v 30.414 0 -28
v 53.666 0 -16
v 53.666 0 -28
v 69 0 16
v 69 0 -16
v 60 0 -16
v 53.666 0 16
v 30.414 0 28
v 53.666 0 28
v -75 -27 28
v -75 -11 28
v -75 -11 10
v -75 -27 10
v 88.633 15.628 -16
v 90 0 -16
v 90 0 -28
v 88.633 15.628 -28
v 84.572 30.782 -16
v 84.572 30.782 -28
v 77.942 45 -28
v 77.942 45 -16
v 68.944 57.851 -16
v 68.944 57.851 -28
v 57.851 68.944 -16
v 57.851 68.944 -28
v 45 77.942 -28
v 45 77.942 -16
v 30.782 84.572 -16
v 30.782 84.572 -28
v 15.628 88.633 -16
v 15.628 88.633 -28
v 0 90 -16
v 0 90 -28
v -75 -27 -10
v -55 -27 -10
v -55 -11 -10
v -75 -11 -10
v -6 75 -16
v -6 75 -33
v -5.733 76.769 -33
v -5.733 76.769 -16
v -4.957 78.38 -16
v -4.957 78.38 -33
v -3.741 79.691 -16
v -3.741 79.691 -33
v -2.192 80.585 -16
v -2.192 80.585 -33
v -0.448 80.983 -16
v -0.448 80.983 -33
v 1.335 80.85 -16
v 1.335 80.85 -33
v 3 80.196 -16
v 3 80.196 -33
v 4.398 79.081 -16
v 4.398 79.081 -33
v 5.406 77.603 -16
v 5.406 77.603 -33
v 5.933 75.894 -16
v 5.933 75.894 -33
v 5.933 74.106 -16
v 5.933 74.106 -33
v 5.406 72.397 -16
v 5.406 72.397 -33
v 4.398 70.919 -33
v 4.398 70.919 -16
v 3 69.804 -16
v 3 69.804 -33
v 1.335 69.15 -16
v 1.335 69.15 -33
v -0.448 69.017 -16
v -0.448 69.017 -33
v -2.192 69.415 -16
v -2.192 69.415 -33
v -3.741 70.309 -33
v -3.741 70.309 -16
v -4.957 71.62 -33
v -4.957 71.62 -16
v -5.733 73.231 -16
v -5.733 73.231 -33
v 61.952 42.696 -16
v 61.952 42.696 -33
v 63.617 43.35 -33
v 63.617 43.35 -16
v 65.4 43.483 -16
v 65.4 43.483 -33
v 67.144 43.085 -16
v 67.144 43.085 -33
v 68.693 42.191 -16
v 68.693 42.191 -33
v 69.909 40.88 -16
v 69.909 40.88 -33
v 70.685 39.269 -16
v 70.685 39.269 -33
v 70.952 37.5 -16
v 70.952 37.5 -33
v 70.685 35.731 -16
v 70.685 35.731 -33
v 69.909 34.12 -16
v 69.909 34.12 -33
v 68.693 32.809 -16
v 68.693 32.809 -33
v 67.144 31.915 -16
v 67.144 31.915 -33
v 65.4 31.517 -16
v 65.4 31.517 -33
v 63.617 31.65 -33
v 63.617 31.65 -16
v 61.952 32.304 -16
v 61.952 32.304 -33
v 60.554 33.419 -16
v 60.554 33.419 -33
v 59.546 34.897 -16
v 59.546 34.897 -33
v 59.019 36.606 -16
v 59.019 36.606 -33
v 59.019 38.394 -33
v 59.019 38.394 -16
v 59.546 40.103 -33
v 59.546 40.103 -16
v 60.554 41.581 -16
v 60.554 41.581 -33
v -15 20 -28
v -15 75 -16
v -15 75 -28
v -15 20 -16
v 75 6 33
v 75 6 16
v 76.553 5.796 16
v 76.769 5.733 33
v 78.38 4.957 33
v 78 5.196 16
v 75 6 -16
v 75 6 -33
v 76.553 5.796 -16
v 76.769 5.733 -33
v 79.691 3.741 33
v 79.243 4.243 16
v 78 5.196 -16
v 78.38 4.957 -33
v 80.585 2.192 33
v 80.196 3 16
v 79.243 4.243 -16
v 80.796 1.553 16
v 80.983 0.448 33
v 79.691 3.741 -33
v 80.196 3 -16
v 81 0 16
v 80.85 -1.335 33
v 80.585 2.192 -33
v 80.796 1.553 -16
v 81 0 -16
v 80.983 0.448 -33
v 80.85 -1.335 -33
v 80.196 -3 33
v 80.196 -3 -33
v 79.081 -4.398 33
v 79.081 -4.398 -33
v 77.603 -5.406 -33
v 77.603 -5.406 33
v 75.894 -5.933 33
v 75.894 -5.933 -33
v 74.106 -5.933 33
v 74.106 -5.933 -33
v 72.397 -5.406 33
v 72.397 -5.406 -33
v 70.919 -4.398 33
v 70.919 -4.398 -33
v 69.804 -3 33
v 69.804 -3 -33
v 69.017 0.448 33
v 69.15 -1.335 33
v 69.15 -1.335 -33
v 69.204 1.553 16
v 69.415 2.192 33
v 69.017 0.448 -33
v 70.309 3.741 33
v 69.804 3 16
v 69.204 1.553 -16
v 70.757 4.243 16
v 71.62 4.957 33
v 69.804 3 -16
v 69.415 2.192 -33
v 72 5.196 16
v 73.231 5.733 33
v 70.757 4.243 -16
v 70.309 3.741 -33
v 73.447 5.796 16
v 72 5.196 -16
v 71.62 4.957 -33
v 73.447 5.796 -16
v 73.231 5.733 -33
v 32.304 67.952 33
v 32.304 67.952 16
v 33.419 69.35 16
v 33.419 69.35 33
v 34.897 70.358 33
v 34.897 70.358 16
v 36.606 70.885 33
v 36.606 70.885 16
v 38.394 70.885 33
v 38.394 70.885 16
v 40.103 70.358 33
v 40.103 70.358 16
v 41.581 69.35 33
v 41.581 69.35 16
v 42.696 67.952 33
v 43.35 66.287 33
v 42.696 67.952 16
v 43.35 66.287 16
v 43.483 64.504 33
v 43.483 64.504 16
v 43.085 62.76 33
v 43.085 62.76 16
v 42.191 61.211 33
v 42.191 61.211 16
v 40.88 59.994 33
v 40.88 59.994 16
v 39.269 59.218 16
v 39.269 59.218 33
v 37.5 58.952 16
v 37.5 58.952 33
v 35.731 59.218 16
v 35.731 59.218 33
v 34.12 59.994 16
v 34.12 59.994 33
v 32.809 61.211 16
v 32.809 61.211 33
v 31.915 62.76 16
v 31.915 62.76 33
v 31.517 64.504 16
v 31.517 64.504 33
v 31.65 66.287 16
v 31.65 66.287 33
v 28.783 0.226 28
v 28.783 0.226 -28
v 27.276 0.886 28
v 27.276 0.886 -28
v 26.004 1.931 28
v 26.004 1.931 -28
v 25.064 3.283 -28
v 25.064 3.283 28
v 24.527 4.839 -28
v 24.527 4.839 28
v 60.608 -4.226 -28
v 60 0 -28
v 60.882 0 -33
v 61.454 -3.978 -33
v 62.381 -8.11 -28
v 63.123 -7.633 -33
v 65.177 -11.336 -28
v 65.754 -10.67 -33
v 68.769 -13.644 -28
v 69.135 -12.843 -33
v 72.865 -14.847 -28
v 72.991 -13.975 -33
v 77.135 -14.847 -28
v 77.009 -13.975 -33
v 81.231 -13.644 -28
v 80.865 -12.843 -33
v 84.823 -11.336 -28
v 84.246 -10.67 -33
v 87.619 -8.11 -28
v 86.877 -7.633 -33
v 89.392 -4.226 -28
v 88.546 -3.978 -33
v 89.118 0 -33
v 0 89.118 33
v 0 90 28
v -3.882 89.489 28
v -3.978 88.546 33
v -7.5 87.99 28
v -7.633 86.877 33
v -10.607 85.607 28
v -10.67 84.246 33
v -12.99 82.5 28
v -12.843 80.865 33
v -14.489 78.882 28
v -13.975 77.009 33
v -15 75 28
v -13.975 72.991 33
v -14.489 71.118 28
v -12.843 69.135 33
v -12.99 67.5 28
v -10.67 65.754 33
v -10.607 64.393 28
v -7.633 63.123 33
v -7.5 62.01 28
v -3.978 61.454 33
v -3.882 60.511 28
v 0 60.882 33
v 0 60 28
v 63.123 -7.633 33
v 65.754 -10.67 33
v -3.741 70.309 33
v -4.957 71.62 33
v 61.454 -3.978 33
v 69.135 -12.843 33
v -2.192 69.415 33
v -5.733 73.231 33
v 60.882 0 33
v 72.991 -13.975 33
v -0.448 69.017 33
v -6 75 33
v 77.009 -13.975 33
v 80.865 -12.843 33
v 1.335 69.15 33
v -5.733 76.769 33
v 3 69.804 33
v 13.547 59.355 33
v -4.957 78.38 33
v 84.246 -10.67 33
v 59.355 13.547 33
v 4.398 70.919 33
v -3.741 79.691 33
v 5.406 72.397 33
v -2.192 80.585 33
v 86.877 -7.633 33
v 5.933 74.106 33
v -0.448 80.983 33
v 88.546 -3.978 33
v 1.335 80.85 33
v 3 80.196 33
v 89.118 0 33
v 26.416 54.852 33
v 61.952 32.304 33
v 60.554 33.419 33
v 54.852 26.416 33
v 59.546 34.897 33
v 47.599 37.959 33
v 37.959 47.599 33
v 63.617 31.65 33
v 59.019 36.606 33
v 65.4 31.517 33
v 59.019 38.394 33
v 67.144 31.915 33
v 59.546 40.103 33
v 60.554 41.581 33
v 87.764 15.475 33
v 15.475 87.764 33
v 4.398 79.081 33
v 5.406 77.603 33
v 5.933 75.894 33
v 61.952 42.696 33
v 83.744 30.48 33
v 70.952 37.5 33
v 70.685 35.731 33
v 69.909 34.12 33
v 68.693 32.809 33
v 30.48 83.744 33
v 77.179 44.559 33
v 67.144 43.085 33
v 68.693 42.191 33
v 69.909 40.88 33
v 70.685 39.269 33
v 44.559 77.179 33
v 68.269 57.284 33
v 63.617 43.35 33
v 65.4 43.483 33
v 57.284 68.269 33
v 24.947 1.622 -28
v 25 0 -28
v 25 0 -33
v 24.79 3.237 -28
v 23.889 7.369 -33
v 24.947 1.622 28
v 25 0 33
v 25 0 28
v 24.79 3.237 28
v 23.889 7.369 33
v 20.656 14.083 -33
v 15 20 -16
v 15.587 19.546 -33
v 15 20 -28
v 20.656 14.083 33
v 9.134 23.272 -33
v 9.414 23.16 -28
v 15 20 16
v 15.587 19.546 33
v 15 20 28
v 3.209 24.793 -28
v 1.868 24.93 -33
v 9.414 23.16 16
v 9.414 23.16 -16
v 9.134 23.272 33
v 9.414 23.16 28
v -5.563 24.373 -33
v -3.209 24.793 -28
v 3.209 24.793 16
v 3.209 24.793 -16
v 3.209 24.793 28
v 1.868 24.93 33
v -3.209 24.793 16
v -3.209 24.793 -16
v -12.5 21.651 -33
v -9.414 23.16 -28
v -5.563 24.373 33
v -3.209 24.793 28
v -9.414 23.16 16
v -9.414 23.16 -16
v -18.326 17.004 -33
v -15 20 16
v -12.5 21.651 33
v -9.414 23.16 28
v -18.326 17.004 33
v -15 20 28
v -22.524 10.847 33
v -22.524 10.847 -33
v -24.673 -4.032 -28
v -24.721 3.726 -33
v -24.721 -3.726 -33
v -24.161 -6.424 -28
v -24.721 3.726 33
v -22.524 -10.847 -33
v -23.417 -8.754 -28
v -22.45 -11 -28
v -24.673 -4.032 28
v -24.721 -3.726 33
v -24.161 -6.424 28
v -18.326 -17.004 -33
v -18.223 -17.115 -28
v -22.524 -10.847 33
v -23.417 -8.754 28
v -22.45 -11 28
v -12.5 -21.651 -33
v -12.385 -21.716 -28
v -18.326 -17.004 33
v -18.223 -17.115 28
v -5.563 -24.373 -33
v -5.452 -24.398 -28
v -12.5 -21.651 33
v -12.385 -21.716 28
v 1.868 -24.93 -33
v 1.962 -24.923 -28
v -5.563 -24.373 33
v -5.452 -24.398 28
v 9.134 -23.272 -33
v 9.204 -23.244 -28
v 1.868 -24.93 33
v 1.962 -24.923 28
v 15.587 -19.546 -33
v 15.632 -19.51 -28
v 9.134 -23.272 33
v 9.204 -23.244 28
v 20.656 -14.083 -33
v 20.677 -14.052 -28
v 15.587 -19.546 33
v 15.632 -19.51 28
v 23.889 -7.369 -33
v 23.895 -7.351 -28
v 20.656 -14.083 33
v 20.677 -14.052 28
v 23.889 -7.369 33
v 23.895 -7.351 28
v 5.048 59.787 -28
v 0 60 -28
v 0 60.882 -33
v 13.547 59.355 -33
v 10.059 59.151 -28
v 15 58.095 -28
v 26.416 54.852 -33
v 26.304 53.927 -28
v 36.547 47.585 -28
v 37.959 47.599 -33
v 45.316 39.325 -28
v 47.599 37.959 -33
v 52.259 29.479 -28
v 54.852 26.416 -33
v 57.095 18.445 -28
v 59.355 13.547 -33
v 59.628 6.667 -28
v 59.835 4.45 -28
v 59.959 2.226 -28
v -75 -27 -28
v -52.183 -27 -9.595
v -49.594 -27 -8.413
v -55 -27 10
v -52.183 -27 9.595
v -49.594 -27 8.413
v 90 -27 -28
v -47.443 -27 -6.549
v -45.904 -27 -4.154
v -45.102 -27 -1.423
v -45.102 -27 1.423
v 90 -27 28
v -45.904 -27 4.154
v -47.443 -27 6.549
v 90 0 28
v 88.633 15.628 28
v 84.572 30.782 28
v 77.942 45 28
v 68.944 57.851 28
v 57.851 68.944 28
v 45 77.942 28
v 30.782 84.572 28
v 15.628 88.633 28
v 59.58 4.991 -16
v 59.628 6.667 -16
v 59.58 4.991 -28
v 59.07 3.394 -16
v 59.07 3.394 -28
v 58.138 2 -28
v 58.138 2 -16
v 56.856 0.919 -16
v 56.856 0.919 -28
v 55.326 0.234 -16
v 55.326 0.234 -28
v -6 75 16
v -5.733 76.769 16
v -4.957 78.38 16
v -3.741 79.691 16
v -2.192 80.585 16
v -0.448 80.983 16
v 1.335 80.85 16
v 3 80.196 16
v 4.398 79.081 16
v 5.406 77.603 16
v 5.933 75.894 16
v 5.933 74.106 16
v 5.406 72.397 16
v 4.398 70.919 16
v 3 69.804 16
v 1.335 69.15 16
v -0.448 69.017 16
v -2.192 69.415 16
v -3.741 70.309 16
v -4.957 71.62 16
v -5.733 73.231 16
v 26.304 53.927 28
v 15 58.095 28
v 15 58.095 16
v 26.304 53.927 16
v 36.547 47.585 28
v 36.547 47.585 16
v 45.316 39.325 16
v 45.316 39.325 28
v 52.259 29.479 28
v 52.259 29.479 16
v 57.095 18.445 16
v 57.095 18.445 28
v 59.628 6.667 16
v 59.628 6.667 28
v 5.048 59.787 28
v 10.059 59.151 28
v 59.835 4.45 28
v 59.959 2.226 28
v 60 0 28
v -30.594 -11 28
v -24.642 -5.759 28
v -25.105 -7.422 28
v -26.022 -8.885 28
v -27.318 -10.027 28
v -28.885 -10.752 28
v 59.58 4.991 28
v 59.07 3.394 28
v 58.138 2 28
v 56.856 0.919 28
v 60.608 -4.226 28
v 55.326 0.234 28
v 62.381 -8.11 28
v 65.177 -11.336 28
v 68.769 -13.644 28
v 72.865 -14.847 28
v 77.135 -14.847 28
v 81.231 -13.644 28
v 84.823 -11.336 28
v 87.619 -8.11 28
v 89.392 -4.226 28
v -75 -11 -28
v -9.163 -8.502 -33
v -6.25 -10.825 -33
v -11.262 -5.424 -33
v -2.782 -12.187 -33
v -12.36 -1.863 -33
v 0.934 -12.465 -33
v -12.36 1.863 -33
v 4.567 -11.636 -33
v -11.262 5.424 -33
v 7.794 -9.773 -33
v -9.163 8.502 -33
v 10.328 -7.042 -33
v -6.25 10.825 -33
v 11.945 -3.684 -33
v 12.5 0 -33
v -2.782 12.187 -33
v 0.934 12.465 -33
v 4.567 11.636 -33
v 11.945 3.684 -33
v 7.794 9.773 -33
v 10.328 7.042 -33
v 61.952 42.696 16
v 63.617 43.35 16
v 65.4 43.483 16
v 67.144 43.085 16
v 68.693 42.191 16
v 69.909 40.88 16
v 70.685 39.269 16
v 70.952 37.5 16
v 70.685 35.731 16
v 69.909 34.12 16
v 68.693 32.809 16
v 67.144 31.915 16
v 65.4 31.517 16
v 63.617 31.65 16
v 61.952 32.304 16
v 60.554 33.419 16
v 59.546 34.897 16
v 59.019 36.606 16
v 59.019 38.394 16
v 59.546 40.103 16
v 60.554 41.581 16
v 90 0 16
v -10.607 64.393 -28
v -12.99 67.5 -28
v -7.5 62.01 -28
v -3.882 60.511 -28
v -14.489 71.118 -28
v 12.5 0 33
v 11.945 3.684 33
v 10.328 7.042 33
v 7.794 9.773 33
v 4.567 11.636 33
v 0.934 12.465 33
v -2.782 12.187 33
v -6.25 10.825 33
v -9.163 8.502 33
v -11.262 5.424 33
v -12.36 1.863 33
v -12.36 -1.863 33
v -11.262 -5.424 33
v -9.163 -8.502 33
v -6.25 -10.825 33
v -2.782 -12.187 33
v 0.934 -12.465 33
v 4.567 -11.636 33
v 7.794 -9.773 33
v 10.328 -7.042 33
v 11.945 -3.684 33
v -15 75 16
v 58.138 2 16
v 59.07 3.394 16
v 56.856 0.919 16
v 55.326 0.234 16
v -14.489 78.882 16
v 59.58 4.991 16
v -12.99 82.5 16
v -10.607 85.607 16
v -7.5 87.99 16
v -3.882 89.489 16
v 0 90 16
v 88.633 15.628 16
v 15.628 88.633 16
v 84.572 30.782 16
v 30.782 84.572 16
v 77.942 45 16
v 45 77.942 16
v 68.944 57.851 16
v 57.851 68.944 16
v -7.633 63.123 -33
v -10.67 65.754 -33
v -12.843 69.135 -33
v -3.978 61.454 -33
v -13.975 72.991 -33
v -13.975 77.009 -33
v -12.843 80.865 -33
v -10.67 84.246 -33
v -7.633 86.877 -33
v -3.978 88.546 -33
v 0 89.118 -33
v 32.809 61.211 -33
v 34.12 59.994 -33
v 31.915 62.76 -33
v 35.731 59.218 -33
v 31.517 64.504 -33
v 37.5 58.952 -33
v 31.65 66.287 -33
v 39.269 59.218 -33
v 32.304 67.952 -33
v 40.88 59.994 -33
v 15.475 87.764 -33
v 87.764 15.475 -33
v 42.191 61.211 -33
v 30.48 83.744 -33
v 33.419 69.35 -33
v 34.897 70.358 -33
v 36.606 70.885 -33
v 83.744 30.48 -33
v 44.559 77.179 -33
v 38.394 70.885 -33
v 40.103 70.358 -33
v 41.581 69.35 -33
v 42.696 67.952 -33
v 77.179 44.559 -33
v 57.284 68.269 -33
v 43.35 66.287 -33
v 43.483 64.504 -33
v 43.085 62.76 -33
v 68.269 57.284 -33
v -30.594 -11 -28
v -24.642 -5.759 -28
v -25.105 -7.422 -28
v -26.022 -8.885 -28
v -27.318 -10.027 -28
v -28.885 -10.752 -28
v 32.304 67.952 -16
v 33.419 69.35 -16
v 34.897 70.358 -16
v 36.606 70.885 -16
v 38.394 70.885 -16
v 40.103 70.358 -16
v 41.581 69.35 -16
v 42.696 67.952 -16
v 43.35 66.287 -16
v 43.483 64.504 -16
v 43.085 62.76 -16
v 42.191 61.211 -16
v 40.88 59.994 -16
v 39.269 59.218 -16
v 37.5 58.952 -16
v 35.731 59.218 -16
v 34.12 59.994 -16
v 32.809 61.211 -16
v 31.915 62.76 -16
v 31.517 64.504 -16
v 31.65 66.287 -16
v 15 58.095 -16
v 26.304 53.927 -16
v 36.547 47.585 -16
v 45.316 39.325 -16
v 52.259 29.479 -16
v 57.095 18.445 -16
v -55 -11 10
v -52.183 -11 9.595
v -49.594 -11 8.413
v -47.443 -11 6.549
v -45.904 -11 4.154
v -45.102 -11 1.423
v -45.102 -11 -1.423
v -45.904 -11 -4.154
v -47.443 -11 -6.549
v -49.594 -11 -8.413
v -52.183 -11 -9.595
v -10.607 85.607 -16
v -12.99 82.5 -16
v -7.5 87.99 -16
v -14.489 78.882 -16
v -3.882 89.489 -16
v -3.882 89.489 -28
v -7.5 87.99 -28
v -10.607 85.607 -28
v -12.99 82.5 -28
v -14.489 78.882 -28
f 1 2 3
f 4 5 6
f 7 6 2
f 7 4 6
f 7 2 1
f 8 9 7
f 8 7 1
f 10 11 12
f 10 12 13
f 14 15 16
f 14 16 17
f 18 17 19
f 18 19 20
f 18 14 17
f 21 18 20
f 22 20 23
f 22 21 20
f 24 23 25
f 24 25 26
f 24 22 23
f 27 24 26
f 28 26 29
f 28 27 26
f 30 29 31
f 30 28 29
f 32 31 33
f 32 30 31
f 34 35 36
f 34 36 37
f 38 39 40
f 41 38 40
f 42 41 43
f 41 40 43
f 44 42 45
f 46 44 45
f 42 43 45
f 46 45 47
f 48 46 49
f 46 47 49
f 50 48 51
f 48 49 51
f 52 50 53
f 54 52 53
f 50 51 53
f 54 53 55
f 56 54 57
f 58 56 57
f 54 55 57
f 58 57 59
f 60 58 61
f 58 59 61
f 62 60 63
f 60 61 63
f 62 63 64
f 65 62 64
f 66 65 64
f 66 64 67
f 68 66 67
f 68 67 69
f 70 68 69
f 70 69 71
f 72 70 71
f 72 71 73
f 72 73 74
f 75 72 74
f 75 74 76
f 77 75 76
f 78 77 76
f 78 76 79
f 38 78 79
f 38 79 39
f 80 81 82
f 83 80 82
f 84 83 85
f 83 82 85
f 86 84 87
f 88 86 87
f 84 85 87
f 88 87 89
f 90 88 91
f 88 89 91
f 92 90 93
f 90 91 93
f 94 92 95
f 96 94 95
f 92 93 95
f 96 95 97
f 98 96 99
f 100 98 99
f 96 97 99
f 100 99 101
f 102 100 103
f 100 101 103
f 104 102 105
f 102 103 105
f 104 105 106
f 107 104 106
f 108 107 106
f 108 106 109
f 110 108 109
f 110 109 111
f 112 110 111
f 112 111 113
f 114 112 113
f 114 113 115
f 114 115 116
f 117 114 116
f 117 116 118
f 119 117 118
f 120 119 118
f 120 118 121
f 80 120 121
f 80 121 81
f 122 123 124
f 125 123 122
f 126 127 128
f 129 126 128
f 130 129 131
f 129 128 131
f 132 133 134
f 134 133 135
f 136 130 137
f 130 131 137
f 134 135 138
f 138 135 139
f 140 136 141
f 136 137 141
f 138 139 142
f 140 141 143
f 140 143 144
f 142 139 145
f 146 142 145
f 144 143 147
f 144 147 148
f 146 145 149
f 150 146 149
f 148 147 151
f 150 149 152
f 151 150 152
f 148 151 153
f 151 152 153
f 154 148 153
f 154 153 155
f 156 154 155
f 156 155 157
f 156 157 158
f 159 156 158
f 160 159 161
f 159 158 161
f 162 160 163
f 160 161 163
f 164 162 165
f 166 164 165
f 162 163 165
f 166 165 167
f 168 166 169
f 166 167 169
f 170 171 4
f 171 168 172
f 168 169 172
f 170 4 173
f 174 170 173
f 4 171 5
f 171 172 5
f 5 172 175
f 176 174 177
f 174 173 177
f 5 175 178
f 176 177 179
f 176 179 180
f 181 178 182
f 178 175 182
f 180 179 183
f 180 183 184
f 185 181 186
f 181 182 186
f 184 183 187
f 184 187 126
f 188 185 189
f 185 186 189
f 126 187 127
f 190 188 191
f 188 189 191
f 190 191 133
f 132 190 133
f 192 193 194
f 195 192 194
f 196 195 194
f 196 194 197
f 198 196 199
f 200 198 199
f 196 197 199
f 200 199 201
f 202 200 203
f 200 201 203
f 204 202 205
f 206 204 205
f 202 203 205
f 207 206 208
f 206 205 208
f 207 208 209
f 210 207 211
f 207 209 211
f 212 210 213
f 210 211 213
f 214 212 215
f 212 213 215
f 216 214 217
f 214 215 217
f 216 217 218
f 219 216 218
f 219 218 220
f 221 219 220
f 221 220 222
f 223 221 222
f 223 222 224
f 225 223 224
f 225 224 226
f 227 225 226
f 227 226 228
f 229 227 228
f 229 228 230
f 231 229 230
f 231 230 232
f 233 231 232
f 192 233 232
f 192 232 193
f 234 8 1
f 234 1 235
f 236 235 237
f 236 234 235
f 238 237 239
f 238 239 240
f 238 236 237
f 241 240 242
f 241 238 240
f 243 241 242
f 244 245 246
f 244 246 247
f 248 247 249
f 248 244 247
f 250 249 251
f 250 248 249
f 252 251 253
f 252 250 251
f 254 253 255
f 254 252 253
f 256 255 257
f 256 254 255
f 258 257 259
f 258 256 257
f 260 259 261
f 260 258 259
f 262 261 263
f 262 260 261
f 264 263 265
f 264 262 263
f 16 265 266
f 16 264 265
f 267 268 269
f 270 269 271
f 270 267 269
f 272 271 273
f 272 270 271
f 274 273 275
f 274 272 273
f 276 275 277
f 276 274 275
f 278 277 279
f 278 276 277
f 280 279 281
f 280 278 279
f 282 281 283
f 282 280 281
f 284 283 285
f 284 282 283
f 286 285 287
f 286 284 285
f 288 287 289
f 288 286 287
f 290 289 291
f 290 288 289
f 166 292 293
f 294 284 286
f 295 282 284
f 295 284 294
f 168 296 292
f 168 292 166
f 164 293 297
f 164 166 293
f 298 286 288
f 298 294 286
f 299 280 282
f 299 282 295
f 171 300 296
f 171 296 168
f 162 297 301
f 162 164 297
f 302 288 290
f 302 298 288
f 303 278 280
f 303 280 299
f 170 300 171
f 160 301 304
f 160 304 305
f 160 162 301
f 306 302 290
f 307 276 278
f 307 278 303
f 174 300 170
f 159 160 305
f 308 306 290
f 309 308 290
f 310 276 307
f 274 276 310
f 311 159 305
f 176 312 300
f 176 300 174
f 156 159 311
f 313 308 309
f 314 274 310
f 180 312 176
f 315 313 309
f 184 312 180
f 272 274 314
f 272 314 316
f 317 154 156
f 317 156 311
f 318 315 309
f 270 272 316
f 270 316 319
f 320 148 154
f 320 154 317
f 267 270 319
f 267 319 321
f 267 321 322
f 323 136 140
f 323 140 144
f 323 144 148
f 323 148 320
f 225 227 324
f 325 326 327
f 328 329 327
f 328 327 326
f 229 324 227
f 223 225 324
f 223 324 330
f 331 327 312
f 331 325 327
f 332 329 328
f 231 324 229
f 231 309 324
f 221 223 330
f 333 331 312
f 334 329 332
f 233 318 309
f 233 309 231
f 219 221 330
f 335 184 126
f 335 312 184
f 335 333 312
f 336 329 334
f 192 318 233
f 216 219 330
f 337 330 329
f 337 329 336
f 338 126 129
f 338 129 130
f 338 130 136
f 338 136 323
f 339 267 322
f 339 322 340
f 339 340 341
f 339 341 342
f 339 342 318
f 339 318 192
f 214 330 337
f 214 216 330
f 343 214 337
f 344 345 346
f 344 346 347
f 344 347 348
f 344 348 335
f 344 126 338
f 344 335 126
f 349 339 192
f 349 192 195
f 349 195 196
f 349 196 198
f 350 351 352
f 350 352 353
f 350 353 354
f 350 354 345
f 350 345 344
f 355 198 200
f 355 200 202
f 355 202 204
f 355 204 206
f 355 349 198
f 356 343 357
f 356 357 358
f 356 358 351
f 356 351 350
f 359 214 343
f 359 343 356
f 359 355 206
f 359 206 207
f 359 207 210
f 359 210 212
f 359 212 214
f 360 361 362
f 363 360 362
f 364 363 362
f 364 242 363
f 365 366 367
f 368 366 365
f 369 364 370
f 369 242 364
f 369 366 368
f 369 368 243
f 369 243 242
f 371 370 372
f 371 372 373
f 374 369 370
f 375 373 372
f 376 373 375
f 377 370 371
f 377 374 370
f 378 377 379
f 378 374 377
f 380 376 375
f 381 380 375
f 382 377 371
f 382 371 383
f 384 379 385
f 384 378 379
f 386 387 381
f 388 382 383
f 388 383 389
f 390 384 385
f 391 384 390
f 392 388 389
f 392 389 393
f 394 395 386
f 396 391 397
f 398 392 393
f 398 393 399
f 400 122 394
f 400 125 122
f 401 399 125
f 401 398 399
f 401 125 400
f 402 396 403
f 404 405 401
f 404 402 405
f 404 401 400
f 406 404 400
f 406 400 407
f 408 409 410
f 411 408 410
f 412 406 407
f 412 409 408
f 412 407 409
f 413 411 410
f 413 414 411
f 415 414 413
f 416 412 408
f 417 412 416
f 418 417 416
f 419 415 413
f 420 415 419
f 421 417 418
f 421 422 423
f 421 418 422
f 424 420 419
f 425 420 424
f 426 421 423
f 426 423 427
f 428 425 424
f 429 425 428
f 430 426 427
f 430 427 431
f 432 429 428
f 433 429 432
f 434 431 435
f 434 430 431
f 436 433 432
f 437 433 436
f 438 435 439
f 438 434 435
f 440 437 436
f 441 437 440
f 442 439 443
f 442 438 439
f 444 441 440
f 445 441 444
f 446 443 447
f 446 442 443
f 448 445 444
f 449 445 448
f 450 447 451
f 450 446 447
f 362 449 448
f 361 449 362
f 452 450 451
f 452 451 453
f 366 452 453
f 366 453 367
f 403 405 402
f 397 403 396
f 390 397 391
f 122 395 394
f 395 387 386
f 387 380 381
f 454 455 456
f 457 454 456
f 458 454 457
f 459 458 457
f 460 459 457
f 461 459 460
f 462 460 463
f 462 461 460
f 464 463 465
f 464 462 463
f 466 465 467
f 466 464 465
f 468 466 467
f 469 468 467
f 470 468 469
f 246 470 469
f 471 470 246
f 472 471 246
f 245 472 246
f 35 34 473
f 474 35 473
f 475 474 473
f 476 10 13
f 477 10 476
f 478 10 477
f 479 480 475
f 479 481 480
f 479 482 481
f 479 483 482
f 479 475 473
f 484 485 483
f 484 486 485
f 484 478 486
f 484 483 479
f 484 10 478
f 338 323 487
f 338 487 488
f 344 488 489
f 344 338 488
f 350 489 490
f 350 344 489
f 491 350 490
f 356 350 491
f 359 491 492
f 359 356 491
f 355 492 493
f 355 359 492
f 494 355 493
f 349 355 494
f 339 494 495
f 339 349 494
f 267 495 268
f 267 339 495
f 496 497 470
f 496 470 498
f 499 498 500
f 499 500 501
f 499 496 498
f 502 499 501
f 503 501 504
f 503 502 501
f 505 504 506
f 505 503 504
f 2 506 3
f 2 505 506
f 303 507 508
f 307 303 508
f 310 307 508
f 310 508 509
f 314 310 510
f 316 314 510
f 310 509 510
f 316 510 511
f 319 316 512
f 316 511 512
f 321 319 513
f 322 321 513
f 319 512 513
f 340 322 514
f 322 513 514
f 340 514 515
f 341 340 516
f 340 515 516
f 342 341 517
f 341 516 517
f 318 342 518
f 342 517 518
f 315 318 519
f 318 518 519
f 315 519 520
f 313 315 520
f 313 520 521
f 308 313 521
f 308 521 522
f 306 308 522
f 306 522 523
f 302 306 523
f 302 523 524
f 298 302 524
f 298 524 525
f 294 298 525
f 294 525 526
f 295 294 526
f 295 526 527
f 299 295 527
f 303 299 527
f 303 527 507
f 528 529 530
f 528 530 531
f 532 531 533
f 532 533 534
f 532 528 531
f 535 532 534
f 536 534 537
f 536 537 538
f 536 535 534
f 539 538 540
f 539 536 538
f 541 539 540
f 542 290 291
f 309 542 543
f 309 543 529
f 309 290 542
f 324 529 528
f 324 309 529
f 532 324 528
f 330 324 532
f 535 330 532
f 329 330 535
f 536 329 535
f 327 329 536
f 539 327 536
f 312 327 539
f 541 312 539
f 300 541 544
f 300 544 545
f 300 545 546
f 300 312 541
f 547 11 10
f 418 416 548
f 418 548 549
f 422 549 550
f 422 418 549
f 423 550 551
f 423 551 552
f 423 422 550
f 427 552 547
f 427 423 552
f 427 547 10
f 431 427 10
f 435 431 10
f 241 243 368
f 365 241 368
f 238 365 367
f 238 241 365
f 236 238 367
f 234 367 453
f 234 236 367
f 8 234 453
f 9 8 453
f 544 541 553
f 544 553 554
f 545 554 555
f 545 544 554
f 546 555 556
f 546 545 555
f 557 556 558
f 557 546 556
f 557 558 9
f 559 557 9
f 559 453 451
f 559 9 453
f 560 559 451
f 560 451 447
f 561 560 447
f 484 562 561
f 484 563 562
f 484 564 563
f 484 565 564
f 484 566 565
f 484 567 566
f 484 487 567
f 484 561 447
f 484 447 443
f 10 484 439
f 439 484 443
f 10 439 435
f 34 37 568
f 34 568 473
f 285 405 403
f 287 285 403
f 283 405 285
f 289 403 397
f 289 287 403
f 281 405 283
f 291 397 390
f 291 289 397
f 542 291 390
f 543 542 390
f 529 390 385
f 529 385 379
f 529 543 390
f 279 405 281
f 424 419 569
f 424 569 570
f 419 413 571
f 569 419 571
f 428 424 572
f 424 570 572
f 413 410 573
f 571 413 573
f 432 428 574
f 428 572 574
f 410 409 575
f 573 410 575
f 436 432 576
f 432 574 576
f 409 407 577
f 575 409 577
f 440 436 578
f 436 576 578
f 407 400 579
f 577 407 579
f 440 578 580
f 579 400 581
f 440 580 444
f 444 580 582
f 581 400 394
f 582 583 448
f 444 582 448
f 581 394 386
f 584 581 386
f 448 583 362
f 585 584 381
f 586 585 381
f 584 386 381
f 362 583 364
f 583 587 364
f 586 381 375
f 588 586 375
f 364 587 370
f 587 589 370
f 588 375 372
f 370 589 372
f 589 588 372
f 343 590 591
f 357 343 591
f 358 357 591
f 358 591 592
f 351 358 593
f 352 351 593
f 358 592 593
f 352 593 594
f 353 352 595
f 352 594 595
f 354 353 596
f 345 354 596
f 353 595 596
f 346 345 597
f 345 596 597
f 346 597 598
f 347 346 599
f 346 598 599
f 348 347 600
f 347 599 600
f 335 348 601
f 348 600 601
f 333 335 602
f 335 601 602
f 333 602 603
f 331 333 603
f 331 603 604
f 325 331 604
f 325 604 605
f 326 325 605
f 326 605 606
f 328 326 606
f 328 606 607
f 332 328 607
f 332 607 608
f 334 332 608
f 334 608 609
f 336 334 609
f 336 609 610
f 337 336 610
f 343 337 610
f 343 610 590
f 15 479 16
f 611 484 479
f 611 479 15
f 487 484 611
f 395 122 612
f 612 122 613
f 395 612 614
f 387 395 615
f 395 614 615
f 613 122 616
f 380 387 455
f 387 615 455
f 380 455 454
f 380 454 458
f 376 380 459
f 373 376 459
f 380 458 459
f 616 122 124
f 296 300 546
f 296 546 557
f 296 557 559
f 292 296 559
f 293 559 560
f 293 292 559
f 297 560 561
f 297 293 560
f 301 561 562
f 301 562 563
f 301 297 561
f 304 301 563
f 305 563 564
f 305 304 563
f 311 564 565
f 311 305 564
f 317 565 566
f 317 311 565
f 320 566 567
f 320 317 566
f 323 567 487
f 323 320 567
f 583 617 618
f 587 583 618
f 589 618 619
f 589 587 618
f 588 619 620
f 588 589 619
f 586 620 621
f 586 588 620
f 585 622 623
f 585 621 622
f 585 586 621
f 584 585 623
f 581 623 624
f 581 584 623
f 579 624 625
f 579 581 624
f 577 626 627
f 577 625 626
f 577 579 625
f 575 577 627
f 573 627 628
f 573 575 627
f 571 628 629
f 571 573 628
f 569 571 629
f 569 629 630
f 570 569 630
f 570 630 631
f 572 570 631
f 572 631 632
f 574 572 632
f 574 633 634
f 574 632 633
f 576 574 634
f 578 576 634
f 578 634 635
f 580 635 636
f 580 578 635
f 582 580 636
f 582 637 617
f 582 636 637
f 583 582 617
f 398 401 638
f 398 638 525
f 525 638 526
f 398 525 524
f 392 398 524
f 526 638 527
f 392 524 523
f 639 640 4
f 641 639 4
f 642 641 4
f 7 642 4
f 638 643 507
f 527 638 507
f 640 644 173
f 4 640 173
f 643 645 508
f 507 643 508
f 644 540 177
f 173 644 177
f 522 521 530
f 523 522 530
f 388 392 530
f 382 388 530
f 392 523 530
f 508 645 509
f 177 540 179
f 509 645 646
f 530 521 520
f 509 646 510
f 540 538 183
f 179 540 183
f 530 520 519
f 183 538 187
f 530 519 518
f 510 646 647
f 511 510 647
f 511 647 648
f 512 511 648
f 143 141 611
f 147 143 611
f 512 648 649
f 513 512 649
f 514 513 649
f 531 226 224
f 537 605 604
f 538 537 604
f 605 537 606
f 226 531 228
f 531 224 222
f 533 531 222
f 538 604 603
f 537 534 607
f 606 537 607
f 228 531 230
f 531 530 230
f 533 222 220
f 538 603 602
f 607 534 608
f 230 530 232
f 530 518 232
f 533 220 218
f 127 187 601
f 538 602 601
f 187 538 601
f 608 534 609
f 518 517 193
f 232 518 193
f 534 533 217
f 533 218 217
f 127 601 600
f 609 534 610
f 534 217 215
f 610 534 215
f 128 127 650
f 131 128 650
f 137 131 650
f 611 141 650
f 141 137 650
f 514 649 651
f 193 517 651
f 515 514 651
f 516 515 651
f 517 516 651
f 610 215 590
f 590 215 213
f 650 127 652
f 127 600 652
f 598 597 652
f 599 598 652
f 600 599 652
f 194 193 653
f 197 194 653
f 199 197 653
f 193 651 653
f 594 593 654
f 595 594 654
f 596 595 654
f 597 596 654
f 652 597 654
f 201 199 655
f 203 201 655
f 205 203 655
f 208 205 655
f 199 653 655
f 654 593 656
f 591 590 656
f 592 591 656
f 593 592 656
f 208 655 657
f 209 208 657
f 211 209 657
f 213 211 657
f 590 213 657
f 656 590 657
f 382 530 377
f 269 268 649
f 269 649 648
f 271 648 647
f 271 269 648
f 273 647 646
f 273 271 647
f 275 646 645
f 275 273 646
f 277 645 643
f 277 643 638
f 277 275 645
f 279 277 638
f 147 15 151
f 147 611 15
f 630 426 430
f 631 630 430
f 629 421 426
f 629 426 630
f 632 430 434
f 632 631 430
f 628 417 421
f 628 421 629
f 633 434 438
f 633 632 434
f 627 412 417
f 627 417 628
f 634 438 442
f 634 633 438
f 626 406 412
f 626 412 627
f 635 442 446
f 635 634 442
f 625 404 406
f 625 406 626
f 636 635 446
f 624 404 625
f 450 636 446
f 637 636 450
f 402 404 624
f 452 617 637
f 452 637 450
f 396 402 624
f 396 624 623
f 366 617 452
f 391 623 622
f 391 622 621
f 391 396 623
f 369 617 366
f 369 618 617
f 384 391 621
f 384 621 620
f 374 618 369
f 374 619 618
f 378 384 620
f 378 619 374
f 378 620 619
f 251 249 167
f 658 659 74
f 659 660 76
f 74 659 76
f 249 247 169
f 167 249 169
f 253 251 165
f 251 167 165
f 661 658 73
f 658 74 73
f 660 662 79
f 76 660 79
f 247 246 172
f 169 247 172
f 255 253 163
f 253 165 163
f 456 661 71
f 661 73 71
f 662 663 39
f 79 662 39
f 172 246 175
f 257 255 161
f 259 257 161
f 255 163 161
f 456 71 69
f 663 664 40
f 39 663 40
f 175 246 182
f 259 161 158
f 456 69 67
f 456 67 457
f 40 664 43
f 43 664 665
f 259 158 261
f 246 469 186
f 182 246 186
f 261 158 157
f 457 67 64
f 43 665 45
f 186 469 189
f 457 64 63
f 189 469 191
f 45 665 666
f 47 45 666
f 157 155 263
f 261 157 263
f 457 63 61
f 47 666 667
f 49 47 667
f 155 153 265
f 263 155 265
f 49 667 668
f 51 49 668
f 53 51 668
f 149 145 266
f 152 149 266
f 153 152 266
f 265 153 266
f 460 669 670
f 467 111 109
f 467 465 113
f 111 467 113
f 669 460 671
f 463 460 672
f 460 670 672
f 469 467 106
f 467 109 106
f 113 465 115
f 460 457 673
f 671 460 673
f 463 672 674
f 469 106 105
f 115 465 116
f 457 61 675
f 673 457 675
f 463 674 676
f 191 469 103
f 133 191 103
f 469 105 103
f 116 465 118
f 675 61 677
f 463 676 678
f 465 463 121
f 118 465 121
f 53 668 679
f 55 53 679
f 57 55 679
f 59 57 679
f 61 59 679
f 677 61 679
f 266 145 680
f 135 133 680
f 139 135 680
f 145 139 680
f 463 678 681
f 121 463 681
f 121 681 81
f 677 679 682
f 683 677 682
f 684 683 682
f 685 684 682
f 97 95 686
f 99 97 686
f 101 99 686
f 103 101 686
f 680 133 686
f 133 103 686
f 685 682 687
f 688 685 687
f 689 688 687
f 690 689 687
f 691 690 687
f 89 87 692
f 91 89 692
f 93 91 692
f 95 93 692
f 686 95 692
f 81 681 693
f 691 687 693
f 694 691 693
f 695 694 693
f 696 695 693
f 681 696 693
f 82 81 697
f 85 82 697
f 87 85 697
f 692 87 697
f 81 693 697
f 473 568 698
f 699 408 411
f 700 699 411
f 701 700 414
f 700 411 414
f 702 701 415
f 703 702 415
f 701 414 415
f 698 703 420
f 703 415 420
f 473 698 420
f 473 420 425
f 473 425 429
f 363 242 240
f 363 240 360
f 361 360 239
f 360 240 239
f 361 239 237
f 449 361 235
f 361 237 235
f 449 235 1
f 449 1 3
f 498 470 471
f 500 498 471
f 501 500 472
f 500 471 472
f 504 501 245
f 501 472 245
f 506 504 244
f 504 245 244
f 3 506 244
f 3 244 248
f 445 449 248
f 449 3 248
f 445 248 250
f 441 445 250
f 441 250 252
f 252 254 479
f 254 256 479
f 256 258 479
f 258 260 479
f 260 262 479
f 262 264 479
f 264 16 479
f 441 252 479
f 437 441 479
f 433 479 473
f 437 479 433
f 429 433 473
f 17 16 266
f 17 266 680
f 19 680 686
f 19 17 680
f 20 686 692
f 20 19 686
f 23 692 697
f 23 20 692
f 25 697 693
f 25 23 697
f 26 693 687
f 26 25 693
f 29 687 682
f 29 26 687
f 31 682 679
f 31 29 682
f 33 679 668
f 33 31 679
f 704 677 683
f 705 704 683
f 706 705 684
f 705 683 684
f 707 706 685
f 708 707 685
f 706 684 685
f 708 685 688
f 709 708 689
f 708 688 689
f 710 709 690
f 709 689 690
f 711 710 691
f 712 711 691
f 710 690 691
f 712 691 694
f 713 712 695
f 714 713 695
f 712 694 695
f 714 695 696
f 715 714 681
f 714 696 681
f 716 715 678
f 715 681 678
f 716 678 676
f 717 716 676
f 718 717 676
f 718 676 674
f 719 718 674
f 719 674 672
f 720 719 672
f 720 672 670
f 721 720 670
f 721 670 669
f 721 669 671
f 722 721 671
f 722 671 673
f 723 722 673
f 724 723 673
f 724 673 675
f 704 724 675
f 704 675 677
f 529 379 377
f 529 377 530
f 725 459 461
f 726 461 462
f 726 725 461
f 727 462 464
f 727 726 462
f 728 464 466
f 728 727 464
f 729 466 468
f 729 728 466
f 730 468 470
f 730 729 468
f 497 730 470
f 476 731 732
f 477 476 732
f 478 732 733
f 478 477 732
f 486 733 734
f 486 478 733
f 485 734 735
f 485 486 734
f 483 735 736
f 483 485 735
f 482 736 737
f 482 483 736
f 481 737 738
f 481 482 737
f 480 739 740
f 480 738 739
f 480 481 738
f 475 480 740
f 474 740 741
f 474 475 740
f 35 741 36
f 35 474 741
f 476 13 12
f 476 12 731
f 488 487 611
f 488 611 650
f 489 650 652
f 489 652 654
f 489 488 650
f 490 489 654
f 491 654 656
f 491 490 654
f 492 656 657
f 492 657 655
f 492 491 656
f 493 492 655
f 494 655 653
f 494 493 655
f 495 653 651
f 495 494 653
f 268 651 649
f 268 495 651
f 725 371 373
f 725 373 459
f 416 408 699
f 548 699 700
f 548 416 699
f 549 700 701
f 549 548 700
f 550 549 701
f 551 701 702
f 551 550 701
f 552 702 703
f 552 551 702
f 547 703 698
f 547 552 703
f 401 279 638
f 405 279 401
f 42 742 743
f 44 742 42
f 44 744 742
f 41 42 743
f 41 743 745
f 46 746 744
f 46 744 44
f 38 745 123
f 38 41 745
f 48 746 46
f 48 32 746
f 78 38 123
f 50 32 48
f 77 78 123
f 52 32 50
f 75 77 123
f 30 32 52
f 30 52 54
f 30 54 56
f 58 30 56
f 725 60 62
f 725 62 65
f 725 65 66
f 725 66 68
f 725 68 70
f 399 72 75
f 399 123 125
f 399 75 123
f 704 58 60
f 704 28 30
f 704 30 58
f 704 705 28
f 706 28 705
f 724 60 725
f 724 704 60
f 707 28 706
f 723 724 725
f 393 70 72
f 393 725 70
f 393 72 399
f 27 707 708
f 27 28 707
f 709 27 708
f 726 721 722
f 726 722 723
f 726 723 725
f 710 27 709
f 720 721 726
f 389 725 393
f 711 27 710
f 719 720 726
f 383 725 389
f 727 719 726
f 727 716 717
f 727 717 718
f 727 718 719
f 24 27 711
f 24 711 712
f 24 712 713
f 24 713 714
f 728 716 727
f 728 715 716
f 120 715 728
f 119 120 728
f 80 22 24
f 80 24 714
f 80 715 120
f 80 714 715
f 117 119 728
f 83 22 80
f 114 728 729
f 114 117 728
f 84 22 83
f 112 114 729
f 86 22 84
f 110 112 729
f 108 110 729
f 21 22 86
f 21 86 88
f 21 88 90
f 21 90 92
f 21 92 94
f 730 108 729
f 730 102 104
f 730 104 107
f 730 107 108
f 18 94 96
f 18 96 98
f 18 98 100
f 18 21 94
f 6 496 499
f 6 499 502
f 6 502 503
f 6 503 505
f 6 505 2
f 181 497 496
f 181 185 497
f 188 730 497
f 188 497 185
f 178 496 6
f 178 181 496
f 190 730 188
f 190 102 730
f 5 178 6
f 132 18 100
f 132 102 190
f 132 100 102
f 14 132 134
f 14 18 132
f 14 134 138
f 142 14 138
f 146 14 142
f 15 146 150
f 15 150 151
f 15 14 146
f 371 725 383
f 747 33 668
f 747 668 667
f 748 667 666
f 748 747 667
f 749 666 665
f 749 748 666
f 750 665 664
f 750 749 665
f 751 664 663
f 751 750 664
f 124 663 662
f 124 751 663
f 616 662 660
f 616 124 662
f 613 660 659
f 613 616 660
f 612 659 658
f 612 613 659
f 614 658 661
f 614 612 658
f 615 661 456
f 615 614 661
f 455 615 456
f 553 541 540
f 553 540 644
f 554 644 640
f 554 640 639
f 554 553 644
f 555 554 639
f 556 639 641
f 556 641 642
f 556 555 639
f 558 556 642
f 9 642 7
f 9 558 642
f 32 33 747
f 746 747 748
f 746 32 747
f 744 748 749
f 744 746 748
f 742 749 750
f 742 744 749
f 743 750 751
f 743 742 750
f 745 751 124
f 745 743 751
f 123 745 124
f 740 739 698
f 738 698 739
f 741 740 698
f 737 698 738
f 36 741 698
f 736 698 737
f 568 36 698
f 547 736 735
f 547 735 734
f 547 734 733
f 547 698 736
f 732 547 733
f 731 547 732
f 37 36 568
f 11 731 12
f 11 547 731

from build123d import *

# Parameters (mm, degrees)
SKETCH1_R                  = 25
BOSS_EXTRUDE1_DEPTH        = 33
CUT_EXTRUDE1_DEPTH         = 49.363209157
CUT_EXTRUDE1_DEPTH_BACK    = 49.363209157
SKETCH2_R                  = 12.5
BOSS_EXTRUDE2_START        = -28
BOSS_EXTRUDE2_DEPTH        = 5
BOSS_EXTRUDE2_DRAFT        = -10
BOSS_EXTRUDE3_START        = -16
BOSS_EXTRUDE3_DEPTH        = 12
BOSS_EXTRUDE5_START        = 28
BOSS_EXTRUDE5_DEPTH        = 5
BOSS_EXTRUDE5_TAPER        = 10
BOSS_EXTRUDE6_START        = 28
BOSS_EXTRUDE6_DEPTH        = 12
BOSS_EXTRUDE7_DEPTH        = 28
F_12_0_12_DIAMETER_HOLE1_D = 12
CIRPATTERN1_COUNT          = 4
CIRPATTERN1_ANGLE          = 90
CUT_EXTRUDE3_DEPTH         = 140.247980237
CUT_EXTRUDE3_DEPTH_BACK    = 56
FILLET1_R                  = 6


with BuildPart() as part:
    # Sketch1 → Boss-Extrude1 (new, symmetric)
    with BuildSketch(Plane.XY):
        Circle(SKETCH1_R)
    extrude(amount=BOSS_EXTRUDE1_DEPTH, both=True)

    # Sketch2 → Cut-Extrude1 (cut, two sides: drawn at the far end of the back side and taken through both)
    with BuildSketch(Plane.XY.offset(-CUT_EXTRUDE1_DEPTH_BACK)):
        Circle(SKETCH2_R)
    extrude(amount=CUT_EXTRUDE1_DEPTH + CUT_EXTRUDE1_DEPTH_BACK, mode=Mode.SUBTRACT)



with BuildPart() as body_2:
    # Sketch4 → Boss-Extrude2 (with draft: the straight prism first)
    with BuildSketch(Plane.XY.offset(BOSS_EXTRUDE2_START)):
        with BuildLine():
            ThreePointArc((90, 0), (63.639610307, 63.639610307), (0, 90))
            ThreePointArc((0, 90), (-15, 75), (0, 60))
            ThreePointArc((0, 60), (42.426406871, 42.426406871), (60, 0))
            ThreePointArc((60, 0), (75, -15), (90, 0))
        make_face()
    extrude(amount=-BOSS_EXTRUDE2_DEPTH)
    # Boss-Extrude2: the draft: its side faces are tilted about the plane it starts from
    boss_extrude2_sides = [body_2.faces().sort_by_distance(p)[0] for p in [
        (42.426406871, 42.426406871, -30.5),
        (75, -15, -30.5),
        (63.639610307, 63.639610307, -30.5),
        (-15, 75, -30.5),
    ]]
    draft(boss_extrude2_sides, Plane.XY.offset(BOSS_EXTRUDE2_START), BOSS_EXTRUDE2_DRAFT)


with BuildPart() as part_1:
    add(part.part)

    add(body_2.part)  # Boss-Extrude3 merges body 2
    # Sketch4<3> → Boss-Extrude3 (add)
    with BuildSketch(Plane.XY.offset(BOSS_EXTRUDE3_START)):
        with BuildLine():
            Line((15, 20), (15, 58.094750193))
            ThreePointArc((15, 58.094750193), (47.434164903, 36.742346142), (60, 0))
            ThreePointArc((60, 0), (75, -15), (90, 0))
            ThreePointArc((90, 0), (63.639610307, 63.639610307), (0, 90))
            ThreePointArc((0, 90), (-10.606601718, 85.606601718), (-15, 75))
            Line((-15, 75), (-15, 20))
            ThreePointArc((-15, 20), (0, 25), (15, 20))
        make_face()
    extrude(amount=-BOSS_EXTRUDE3_DEPTH)



with BuildPart() as body_2_2:
    # Sketch4<5> → Boss-Extrude5 (new body)
    with BuildSketch(Plane.XY.offset(BOSS_EXTRUDE5_START)):
        with BuildLine():
            ThreePointArc((90, 0), (63.639610307, 63.639610307), (0, 90))
            ThreePointArc((0, 90), (-15, 75), (0, 60))
            ThreePointArc((0, 60), (42.426406871, 42.426406871), (60, 0))
            ThreePointArc((60, 0), (75, -15), (90, 0))
        make_face()
    extrude(amount=BOSS_EXTRUDE5_DEPTH, taper=BOSS_EXTRUDE5_TAPER)


with BuildPart() as part_2:
    add(part_1.part)

    add(body_2_2.part)  # Boss-Extrude6 merges body 2 2
    # Sketch4<8> → Boss-Extrude6 (add)
    with BuildSketch(Plane.XY.offset(BOSS_EXTRUDE6_START)):
        with BuildLine():
            ThreePointArc((90, 0), (63.639610307, 63.639610307), (0, 90))
            ThreePointArc((0, 90), (-15, 75), (0, 60))
            ThreePointArc((0, 60), (42.426406871, 42.426406871), (60, 0))
            ThreePointArc((60, 0), (75, -15), (90, 0))
        make_face()
        with BuildLine():
            ThreePointArc((0, 60), (-10.606601718, 64.393398282), (-15, 75))
            Line((-15, 75), (-15, 20))
            ThreePointArc((-15, 20), (0, 25), (15, 20))
            Line((15, 20), (15, 58.094750193))
            ThreePointArc((15, 58.094750193), (7.560257549, 59.521781776), (0, 60))
        make_face()
    extrude(amount=-BOSS_EXTRUDE6_DEPTH)

    # Sketch10 → Boss-Extrude7 (add, symmetric)
    with BuildSketch(Plane.XY):
        with BuildLine():
            Line((-22.449944321, -11), (-75, -11))
            Line((-75, -11), (-75, -27))
            Line((-75, -27), (90, -27))
            Line((90, -27), (90, 0))
            Line((90, 0), (25, 0))
            ThreePointArc((25, 0), (5.645856533, -24.354143467), (-22.449944321, -11))
        make_face()
    extrude(amount=BOSS_EXTRUDE7_DEPTH, both=True)

    # Ø12.0 (12) Diameter Hole1 (through all)
    with Locations(Plane.XY.offset(33)):
        with Locations((0, 75)):
            f_12_0_12_diameter_hole1 = Hole(F_12_0_12_DIAMETER_HOLE1_D / 2)

    # CirPattern1: Ø12.0 (12) Diameter Hole1 ×4 about axis
    cirpattern1_axis = Axis((0, 0, 0), (0, 0, -1))
    for i in range(1, CIRPATTERN1_COUNT):
        add(f_12_0_12_diameter_hole1.rotate(cirpattern1_axis, i * CIRPATTERN1_ANGLE / (CIRPATTERN1_COUNT - 1)), mode=Mode.SUBTRACT)

    # Sketch11 → Cut-Extrude3 (cut, two sides: drawn at the far end of the back side and taken through both)
    with BuildSketch(Plane(origin=(0, -11, 0), x_dir=(1, 0, 0), z_dir=(0, 1, 0)).offset(-CUT_EXTRUDE3_DEPTH_BACK)):
        with BuildLine():
            Line((-55, 10), (-75, 10))
            Line((-75, 10), (-75, -10))
            Line((-75, -10), (-55, -10))
            ThreePointArc((-55, -10), (-45, 0), (-55, 10))
        make_face()
    extrude(amount=CUT_EXTRUDE3_DEPTH + CUT_EXTRUDE3_DEPTH_BACK, mode=Mode.SUBTRACT)

    # Fillet1
    # the kernel refuses this fillet: 6 mm, written as the material it adds along each edge
    with BuildSketch(Plane(origin=(60, 0, -16), x_dir=(-0.055641755903696445, 0.9984507974857616, 0), z_dir=(0, 0, -1))) as fillet1_piece_1:
        with BuildLine():
            CenterArc((6.343160173, -5.990704785), FILLET1_R, 86.810314896, 96.379370208)
            Line((0.352455388, -6.32455532), (0, 0))
            ThreePointArc((0, 0), (3.338505354, 0.092952151), (6.677010708, 0))
        make_face()
    extrude(amount=12)
    with BuildSketch(Plane(origin=(60, 0, 28), x_dir=(-1, 0, 0), z_dir=(0, 0, -1))) as fillet1_piece_2:
        with BuildLine():
            CenterArc((6.33436854, 6), FILLET1_R, 173.620629792, 96.379370208)
            ThreePointArc((0.3715206, 6.666666667), (0.092952151, 3.338505354), (0, 0))
            Line((0, 0), (6.33436854, 0))
        make_face()
    extrude(amount=12)
    with BuildSketch(Plane(origin=(25, 0, 28), x_dir=(-0.09723494563874313, 0.9952614557726179, 0), z_dir=(0, 0, -1))) as fillet1_piece_3:
        with BuildLine():
            CenterArc((5.445156956, 5.971568735), FILLET1_R, 185.579968436, 78.840063128)
            Line((-0.526411779, 5.388159061), (0, 0))
            ThreePointArc((0, 0), (2.430873641, 0.118463606), (4.861747282, 0))
        make_face()
    extrude(amount=56)
    with BuildSketch(Plane(origin=(-22.449944321, -11, 28), x_dir=(-0.30391401052504813, 0.9526994668868987, 0), z_dir=(0, 0, -1))) as fillet1_piece_4:
        with BuildLine():
            CenterArc((8.191325007, -5.935464984), FILLET1_R, 98.411041025, 99.281799087)
            Line((2.475128206, -7.758949048), (0, 0))
            ThreePointArc((0, 0), (3.656841521, -0.268895898), (7.313683042, 0))
        make_face()
    extrude(amount=56)


solid = part_2.part
